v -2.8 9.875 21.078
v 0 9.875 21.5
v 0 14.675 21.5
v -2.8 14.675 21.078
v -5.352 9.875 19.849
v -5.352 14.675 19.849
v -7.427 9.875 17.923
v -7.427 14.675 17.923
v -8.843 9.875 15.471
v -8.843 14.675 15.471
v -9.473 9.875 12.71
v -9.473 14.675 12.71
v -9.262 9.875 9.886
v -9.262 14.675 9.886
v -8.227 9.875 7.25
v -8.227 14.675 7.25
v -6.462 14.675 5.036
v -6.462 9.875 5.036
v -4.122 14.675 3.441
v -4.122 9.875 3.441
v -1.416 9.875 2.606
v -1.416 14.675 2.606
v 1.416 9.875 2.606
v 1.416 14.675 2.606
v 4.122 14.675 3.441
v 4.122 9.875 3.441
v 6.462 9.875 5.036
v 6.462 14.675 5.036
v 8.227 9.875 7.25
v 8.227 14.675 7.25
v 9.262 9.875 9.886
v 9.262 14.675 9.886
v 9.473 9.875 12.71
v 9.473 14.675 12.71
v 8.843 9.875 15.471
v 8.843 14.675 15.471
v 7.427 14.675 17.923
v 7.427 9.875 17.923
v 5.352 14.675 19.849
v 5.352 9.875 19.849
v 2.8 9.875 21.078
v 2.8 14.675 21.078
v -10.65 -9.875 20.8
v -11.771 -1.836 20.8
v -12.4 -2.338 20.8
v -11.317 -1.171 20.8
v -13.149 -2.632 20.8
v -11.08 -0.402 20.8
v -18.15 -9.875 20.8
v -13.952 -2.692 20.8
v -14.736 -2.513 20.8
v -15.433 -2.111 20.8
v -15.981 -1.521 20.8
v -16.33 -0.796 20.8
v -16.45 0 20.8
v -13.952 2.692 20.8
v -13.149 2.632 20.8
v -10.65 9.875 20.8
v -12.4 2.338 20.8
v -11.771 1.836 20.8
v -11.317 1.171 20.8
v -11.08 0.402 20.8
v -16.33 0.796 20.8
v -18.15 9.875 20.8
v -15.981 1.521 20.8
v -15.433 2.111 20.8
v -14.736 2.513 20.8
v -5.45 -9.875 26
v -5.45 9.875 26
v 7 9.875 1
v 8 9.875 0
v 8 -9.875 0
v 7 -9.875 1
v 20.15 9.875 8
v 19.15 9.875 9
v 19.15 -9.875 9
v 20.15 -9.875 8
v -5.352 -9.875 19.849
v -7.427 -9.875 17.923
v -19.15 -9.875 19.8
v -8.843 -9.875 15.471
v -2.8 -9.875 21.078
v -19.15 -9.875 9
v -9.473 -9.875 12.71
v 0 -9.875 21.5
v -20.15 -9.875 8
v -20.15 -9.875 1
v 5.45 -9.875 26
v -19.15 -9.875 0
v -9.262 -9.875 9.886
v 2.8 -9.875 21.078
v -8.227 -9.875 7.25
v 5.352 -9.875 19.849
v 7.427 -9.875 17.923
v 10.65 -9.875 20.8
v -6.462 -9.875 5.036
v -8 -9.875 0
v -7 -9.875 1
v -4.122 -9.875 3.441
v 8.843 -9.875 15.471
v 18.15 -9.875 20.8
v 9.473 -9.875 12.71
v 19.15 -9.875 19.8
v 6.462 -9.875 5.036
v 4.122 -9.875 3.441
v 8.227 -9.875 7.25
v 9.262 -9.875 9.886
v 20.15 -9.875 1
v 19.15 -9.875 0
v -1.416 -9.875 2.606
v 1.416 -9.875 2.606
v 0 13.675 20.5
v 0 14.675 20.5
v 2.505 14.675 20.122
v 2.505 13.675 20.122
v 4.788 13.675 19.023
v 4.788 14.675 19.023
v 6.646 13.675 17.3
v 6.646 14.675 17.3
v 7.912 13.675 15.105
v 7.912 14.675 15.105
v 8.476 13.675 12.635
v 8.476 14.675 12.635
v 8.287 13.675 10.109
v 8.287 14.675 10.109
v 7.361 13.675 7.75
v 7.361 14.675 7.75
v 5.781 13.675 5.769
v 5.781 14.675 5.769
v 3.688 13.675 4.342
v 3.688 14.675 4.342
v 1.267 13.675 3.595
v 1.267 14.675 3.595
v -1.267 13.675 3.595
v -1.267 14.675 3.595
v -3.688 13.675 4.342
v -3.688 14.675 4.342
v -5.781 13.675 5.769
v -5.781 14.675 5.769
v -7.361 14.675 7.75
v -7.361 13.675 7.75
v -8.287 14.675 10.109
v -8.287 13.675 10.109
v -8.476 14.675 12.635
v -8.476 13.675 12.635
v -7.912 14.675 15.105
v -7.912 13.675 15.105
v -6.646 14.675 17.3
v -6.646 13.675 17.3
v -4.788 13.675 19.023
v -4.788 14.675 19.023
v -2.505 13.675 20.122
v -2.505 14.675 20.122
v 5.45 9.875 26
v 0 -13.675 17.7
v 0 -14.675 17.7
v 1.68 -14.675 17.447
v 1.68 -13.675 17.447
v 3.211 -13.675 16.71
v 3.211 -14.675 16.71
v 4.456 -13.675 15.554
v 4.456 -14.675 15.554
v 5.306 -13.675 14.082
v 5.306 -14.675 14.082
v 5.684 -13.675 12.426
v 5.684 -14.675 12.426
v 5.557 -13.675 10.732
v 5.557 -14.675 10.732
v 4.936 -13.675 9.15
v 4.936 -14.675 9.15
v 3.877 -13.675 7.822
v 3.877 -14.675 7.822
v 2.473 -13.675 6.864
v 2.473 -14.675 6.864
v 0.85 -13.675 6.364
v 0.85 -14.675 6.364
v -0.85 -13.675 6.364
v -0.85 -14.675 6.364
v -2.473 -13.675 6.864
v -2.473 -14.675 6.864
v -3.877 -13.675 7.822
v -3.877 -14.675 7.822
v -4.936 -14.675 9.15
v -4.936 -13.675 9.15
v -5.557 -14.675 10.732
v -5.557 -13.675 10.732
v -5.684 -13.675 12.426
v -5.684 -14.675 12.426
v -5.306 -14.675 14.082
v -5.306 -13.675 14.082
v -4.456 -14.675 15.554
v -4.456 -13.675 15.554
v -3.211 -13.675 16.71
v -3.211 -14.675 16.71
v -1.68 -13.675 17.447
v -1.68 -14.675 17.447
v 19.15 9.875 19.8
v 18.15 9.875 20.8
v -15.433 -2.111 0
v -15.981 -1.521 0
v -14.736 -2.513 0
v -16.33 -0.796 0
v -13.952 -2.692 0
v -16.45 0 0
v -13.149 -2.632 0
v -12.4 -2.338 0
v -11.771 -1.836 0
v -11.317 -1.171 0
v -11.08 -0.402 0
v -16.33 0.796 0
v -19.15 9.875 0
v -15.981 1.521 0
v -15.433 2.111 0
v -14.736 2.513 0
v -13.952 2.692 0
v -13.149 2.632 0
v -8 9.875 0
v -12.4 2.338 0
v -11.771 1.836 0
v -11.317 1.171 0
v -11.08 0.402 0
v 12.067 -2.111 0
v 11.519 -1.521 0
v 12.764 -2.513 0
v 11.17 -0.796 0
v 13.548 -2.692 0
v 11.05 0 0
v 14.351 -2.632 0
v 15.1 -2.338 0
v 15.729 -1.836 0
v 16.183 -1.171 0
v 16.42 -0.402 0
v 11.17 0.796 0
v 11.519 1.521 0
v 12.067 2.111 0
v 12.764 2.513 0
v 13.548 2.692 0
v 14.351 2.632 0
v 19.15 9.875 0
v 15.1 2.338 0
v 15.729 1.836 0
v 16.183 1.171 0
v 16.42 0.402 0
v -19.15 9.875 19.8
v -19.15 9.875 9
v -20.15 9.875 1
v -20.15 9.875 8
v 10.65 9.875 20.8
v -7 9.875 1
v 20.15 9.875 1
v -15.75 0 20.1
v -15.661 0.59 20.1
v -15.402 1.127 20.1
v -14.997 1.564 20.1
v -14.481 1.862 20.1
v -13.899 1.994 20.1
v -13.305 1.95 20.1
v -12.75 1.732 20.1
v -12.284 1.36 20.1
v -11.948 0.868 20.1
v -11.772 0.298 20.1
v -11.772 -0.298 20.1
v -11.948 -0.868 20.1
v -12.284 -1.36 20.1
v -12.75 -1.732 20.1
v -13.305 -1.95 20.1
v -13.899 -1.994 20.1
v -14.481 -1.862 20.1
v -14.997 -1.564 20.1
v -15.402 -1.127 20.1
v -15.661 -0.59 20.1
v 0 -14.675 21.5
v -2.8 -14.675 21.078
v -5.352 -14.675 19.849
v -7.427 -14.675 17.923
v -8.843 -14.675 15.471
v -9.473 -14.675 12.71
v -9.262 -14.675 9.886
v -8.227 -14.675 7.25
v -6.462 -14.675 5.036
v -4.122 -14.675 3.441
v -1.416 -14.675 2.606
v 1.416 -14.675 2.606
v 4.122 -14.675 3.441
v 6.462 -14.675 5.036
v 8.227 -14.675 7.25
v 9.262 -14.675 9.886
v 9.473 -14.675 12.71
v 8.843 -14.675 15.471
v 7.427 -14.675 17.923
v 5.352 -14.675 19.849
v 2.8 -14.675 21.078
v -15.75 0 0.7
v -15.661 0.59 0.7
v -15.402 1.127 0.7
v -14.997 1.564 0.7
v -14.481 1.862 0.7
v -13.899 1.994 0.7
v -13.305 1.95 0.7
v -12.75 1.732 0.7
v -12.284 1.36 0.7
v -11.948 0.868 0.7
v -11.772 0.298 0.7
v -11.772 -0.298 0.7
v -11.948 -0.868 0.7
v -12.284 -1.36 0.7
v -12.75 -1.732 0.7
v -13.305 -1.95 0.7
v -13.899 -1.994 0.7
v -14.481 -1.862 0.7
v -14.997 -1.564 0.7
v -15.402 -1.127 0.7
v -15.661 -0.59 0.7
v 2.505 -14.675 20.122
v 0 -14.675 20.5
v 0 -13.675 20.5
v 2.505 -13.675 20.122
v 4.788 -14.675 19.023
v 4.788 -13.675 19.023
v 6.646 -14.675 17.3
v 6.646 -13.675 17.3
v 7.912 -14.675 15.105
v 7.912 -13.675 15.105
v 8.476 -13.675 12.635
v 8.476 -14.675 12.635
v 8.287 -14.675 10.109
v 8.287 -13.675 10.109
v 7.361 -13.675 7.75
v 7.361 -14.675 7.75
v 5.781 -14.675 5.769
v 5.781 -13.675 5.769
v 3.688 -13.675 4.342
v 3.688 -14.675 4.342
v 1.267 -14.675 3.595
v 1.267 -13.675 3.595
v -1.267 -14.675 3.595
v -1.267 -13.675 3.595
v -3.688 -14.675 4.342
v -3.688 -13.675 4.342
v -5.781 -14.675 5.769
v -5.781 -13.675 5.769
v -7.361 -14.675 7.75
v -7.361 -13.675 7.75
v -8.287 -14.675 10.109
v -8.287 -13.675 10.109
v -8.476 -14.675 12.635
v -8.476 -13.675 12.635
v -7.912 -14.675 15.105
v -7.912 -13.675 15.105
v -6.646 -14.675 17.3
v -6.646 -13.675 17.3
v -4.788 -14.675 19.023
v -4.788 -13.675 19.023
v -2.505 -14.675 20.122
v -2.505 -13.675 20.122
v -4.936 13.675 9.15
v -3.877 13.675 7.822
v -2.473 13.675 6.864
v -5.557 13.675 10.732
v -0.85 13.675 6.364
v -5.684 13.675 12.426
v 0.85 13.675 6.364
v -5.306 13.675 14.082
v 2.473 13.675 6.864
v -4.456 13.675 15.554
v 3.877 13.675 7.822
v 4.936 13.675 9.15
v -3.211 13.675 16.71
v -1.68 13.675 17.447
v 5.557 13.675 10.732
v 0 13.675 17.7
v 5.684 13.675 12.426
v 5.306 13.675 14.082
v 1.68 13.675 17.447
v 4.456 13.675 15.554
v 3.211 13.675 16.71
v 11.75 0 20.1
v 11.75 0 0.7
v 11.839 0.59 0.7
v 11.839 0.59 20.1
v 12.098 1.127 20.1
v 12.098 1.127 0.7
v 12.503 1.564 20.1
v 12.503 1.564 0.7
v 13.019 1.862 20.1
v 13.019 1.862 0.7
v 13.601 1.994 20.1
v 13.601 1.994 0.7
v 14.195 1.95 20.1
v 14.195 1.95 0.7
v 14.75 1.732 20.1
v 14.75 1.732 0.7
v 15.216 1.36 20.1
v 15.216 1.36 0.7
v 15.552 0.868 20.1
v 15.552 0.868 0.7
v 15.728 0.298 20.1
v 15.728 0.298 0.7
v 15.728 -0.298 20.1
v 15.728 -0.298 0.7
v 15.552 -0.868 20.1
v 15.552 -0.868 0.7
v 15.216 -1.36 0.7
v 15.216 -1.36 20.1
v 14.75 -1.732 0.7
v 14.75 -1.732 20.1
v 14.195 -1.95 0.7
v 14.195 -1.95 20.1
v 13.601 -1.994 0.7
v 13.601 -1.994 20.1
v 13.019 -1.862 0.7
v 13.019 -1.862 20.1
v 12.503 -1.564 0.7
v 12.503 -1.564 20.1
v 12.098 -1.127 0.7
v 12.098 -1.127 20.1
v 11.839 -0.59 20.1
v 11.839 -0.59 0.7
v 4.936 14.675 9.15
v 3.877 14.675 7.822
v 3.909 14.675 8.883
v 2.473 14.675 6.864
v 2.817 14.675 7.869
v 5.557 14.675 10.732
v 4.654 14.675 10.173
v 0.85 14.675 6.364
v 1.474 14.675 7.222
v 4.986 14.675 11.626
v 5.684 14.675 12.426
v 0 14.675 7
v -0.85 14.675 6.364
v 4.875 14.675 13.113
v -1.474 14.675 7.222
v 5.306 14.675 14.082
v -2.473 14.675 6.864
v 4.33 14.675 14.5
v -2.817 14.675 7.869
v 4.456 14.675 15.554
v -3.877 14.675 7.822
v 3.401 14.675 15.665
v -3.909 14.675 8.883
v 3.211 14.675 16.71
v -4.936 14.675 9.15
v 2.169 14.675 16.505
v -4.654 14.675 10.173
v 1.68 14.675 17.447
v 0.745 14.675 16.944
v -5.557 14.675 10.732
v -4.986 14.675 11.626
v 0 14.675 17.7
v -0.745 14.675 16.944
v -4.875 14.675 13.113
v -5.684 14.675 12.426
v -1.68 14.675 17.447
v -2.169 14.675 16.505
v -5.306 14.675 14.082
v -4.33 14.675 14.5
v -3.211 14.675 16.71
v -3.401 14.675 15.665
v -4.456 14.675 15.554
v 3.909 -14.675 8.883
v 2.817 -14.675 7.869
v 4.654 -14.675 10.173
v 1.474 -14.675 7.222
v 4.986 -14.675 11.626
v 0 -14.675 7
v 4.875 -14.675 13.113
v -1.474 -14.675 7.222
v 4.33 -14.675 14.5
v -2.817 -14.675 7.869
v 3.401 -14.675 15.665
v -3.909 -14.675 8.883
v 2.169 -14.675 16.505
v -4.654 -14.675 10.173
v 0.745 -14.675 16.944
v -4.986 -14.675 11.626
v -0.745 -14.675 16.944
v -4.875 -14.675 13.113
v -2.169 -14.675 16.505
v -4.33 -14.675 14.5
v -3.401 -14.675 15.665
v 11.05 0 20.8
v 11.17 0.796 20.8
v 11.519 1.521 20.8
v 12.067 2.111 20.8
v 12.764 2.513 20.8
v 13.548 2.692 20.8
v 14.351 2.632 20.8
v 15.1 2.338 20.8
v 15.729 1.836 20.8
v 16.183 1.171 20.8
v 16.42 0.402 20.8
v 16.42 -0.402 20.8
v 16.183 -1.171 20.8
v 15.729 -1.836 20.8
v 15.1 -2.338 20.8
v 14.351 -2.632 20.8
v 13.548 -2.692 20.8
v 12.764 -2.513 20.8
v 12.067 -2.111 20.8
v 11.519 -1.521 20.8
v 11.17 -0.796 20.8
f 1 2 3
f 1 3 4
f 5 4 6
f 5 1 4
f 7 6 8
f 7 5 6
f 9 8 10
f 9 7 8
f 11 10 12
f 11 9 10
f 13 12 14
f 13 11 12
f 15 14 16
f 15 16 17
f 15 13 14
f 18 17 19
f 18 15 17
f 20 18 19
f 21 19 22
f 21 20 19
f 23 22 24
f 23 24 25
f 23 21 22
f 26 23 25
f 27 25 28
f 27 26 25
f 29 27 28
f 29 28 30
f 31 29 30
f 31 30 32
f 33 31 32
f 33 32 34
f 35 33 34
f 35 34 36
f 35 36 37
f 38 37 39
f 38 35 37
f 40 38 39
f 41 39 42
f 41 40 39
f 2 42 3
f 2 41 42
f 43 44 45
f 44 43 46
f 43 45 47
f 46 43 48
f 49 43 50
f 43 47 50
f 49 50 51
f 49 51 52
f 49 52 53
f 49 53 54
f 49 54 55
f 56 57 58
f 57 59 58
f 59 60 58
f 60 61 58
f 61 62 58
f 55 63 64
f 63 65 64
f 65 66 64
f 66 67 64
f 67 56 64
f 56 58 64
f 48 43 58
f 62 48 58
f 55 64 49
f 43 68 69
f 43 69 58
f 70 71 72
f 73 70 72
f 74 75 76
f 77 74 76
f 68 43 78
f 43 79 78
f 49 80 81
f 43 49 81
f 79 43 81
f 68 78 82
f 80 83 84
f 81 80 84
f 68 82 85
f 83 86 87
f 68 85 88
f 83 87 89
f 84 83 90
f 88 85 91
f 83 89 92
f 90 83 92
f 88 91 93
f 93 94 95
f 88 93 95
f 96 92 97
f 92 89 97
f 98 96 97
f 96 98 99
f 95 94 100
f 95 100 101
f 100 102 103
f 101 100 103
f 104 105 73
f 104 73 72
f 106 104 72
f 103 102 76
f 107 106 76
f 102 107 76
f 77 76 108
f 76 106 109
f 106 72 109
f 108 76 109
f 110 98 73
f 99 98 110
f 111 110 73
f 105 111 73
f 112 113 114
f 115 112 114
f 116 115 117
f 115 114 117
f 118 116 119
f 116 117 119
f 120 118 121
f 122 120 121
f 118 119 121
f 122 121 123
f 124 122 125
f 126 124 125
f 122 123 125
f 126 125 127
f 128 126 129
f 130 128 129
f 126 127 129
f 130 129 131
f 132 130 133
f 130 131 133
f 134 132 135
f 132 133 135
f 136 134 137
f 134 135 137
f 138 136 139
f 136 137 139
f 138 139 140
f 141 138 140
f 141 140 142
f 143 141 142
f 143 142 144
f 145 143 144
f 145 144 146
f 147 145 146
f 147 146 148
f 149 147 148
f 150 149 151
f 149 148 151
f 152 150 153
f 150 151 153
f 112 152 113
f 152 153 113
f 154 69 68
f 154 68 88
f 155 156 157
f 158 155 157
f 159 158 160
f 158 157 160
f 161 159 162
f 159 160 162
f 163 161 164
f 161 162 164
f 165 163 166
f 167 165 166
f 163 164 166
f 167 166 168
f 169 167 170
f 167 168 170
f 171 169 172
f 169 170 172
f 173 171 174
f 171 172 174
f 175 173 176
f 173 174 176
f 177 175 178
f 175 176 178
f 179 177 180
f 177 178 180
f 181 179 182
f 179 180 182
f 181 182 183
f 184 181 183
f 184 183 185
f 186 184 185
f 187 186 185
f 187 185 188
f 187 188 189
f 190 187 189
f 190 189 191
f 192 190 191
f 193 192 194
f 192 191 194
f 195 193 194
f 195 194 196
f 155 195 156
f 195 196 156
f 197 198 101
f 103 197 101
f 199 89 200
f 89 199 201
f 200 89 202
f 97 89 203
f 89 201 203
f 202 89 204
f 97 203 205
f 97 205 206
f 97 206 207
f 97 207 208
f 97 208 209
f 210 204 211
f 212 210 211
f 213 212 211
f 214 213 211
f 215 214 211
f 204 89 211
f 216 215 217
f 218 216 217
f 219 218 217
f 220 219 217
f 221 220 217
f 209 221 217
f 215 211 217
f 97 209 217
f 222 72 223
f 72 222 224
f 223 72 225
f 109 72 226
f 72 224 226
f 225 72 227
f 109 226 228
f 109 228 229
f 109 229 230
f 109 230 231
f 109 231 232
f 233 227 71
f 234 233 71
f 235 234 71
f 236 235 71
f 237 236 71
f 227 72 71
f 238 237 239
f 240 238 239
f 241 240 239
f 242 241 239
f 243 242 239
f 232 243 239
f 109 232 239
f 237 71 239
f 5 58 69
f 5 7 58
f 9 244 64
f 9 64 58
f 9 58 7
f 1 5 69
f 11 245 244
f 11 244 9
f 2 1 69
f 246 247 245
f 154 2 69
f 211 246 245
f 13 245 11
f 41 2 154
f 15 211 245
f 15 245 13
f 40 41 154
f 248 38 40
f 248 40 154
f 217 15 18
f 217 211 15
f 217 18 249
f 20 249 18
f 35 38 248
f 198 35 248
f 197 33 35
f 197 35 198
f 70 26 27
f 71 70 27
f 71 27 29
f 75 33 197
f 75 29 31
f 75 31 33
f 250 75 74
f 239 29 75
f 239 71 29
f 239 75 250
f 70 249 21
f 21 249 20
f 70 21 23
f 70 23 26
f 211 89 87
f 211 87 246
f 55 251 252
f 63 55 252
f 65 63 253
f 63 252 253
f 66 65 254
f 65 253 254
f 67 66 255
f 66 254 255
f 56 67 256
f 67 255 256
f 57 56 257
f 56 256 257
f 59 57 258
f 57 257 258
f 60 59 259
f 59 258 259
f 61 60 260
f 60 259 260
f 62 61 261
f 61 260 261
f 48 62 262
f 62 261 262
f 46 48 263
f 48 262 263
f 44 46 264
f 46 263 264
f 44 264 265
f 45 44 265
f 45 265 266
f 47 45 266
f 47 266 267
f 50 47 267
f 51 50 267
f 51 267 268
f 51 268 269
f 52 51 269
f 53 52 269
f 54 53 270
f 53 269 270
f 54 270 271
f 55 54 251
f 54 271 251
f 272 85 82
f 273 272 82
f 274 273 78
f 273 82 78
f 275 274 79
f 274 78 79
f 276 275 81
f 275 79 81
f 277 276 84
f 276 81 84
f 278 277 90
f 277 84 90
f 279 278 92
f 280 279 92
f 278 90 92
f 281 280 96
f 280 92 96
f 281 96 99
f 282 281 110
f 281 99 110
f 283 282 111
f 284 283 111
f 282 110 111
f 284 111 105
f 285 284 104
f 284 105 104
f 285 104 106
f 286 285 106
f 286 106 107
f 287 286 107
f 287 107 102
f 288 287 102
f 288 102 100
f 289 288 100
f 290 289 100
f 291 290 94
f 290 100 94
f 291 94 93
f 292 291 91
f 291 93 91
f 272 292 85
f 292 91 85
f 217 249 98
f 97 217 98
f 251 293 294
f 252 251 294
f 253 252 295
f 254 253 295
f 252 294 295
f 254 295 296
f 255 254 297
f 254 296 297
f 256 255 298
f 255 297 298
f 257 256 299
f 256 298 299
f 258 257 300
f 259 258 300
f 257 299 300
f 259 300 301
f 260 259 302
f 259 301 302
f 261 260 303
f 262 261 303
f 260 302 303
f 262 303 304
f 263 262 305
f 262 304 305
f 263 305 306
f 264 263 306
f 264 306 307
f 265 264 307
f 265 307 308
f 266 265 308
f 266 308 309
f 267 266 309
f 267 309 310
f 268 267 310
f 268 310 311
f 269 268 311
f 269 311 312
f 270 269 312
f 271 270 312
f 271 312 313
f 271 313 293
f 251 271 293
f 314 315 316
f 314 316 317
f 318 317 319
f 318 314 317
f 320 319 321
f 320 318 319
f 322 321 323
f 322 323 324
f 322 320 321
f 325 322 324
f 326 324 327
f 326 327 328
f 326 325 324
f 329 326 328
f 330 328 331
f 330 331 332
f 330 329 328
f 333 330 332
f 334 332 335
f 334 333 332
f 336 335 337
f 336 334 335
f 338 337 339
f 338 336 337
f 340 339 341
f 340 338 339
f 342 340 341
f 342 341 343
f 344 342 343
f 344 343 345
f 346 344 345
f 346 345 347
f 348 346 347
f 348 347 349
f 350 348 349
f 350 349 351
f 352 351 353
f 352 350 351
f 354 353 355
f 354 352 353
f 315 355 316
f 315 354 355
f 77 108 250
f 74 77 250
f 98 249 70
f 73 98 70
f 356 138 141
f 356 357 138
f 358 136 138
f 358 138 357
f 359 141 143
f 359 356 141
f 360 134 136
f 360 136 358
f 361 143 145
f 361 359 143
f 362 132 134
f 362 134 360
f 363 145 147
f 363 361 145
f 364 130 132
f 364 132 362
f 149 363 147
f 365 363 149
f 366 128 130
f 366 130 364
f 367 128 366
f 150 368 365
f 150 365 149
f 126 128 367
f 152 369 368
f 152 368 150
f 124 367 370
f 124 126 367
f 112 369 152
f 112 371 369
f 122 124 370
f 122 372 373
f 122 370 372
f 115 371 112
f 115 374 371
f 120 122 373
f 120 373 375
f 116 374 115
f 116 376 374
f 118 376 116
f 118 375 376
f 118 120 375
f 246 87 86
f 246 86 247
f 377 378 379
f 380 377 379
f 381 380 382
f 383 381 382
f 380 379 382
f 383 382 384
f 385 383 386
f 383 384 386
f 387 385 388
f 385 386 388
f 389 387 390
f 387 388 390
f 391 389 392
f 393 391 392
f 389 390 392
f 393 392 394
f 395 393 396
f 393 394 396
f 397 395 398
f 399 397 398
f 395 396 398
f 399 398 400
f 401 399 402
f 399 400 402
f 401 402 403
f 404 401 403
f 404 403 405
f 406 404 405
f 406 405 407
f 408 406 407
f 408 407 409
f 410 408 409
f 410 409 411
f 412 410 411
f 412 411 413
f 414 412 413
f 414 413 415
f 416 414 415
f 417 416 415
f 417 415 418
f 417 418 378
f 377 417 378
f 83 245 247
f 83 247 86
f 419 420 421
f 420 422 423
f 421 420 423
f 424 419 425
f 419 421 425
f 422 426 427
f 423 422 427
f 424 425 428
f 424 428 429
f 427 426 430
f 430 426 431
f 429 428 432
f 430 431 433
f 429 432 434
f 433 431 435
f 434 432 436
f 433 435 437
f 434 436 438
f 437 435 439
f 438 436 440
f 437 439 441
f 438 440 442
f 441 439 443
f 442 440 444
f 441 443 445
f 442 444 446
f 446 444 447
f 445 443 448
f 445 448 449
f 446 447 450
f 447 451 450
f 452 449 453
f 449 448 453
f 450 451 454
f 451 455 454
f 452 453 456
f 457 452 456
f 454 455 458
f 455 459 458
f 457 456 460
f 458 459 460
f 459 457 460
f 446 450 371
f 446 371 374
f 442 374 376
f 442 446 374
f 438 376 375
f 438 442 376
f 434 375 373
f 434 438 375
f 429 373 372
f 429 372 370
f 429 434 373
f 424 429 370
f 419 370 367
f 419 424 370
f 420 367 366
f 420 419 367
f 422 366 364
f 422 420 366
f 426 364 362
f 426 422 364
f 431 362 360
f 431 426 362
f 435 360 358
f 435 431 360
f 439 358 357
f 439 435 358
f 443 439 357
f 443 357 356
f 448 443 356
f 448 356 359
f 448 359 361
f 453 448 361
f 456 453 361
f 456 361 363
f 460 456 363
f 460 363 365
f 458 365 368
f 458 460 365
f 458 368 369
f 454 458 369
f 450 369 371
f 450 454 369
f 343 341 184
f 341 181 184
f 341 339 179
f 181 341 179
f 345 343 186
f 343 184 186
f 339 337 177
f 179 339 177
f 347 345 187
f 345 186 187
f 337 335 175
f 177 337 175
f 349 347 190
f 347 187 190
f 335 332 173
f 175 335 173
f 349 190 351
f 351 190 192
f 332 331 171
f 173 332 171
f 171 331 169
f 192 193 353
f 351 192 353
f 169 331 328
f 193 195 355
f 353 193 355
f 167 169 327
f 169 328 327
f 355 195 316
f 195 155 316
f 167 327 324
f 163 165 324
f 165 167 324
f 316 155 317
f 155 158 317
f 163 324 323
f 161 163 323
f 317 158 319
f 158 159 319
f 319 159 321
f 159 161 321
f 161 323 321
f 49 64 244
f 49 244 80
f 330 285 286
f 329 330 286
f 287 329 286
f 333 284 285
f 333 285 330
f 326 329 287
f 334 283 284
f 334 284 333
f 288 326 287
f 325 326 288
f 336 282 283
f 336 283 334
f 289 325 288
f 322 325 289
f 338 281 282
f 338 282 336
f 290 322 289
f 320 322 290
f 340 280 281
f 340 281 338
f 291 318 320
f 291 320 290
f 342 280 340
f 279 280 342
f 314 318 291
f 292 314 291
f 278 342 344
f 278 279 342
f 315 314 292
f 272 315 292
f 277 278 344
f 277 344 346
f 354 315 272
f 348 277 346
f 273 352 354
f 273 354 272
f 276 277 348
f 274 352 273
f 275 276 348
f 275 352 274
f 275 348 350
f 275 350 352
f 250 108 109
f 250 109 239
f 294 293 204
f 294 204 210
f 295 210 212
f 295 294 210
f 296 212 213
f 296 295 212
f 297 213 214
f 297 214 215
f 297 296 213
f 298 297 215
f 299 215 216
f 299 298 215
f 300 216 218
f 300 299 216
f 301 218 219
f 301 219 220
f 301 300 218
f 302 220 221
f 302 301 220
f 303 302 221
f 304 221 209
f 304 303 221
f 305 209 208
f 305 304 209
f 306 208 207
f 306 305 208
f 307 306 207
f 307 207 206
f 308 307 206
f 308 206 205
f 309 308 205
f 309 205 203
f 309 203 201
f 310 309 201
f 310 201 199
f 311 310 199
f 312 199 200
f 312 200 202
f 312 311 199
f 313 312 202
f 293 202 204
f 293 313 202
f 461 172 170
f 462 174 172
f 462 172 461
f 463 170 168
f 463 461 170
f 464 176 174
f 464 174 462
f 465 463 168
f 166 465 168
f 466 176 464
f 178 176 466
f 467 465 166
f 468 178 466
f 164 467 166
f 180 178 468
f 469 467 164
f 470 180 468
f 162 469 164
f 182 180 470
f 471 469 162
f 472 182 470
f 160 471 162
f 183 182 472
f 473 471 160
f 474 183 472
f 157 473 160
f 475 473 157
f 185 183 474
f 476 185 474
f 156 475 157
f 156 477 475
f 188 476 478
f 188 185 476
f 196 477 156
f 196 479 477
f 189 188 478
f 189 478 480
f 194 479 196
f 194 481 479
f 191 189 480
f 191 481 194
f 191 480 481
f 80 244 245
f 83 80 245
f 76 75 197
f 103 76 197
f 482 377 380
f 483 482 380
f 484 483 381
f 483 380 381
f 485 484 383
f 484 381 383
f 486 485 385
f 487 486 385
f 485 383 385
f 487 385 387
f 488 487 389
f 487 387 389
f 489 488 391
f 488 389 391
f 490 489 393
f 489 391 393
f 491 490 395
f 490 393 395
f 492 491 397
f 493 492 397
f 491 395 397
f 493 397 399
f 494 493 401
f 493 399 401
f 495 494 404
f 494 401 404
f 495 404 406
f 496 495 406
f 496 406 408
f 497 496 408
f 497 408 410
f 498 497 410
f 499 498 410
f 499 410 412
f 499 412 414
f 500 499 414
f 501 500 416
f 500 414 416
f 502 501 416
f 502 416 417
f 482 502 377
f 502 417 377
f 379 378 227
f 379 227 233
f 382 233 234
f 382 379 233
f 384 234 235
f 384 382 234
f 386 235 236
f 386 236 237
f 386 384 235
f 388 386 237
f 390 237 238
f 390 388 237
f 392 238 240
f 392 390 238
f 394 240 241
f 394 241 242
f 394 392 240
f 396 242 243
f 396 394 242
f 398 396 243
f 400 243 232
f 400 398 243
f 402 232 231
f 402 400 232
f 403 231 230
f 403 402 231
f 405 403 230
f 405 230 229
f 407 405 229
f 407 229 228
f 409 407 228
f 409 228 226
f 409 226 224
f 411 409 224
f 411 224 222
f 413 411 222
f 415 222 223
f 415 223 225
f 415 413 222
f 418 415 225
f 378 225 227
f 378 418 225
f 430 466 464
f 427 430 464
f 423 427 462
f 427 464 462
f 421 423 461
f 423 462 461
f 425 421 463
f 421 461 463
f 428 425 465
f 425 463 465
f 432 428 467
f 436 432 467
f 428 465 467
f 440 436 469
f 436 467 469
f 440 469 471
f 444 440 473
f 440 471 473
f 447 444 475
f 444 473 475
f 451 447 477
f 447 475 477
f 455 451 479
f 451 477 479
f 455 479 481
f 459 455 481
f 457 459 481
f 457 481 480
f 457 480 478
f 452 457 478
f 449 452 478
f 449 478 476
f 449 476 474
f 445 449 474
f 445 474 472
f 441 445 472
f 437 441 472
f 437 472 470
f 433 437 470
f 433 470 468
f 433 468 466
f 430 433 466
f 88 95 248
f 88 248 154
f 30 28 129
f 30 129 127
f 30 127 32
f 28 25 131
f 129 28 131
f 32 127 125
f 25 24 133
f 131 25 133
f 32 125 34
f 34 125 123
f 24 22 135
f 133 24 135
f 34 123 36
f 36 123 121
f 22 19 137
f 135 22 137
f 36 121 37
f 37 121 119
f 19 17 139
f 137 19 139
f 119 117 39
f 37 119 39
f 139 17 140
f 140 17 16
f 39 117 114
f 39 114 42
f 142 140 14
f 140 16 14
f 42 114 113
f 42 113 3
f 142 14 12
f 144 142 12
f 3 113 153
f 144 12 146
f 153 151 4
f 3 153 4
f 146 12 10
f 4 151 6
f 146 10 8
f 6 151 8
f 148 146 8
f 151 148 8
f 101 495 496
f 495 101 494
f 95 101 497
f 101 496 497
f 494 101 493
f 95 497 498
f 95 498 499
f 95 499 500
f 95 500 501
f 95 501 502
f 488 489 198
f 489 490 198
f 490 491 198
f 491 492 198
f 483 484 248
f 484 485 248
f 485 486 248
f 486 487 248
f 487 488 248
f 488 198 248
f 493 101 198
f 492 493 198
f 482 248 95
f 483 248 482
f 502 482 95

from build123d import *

# Parameters (mm, degrees)
CROQUIS1_W              = 40.3
CROQUIS1_H              = 19.75
SALIENTE_EXTRUIR1_DEPTH = 26
CROQUIS2_W              = 14
CROQUIS2_H              = 1
CORTAR_EXTRUIR1_DEPTH   = 20
CROQUIS3_R              = 2
CORTAR_EXTRUIR2_DEPTH   = 26
CROQUIS4_R              = 9.5
SALIENTE_EXTRUIR2_DEPTH = 4.8
CROQUIS5_R              = 5
CORTAR_EXTRUIR3_DEPTH   = 30
CROQUIS6_R              = 8.5
CROQUIS6_R_2            = 5.7
CORTAR_EXTRUIR4_DEPTH   = 1
CHAFL_N1_SIZE           = 1
CHAFL_N2_SIZE           = 0.7


with BuildPart() as part:
    # Croquis1 → Saliente-Extruir1 (new body)
    with BuildSketch(Plane.XY):
        Rectangle(CROQUIS1_W, CROQUIS1_H)
    extrude(amount=SALIENTE_EXTRUIR1_DEPTH)

    # Croquis2 → Cortar-Extruir1 (cut)
    with BuildSketch(Plane(origin=(0, 9.875, 0), x_dir=(1, 0, 0), z_dir=(0, 1, 0))):
        Polygon((-19.15, -9), (-20.15, -9), (-20.15, -26), (-5.45, -26), (-10.65, -20.8), (-19.15, -20.8), align=None)
        Polygon((20.15, -26), (20.15, -9), (19.15, -9), (19.15, -20.8), (10.65, -20.8), (5.45, -26), align=None)
        with Locations((0, -0.5)):
            Rectangle(CROQUIS2_W, CROQUIS2_H)
    extrude(amount=-CORTAR_EXTRUIR1_DEPTH, mode=Mode.SUBTRACT)

    # Croquis3 → Cortar-Extruir2 (cut)
    with BuildSketch(Plane(origin=(0, 0, 0), x_dir=(-1, 0, 0), z_dir=(0, 0, -1))):
        with Locations((-13.75, 0)):
            Circle(CROQUIS3_R)
        with Locations((13.75, 0)):
            Circle(CROQUIS3_R)
    extrude(amount=-CORTAR_EXTRUIR2_DEPTH, mode=Mode.SUBTRACT)

    # Croquis4 → Saliente-Extruir2 (add)
    with BuildSketch(Plane.XZ.offset(9.875)):
        with Locations(Location((0, 12, 0), (0, 0, 90))):
            Circle(CROQUIS4_R)
    saliente_extruir2 = extrude(amount=SALIENTE_EXTRUIR2_DEPTH)

    # Simetría1: Saliente-Extruir2 across plane
    add(saliente_extruir2.mirror(Plane.ZX))

    # Croquis5 → Cortar-Extruir3 (cut)
    with BuildSketch(Plane.XZ.offset(14.675)):
        with Locations(Location((0, 12, 0), (0, 0, 270))):
            Circle(CROQUIS5_R)
    extrude(amount=-CORTAR_EXTRUIR3_DEPTH, mode=Mode.SUBTRACT)

    # Croquis6 → Cortar-Extruir4 (cut)
    with BuildSketch(Plane(origin=(0, 14.675, 0), x_dir=(1, 0, 0), z_dir=(0, 1, 0))):
        with Locations(Location((0, -12, 0), (0, 0, 270))):
            Circle(CROQUIS6_R)
        with Locations(Location((0, -12, 0), (0, 0, 270))):
            Circle(CROQUIS6_R_2, mode=Mode.SUBTRACT)
    cortar_extruir4 = extrude(amount=-CORTAR_EXTRUIR4_DEPTH, mode=Mode.SUBTRACT)

    # Simetría2: Cortar-Extruir4 across plane
    add(cortar_extruir4.mirror(Plane.ZX), mode=Mode.SUBTRACT)

    # Chaflán1
    chafl_n1_edges = [part.edges().sort_by_distance(p)[0] for p in [
        (-19.15, 0, 20.8),
        (-20.15, 0, 9),
        (19.15, 0, 20.8),
        (20.15, 0, 9),
        (-20.15, 0, 0),
        (20.15, 0, 0),
        (7, 0, 0),
        (-7, 0, 0),
    ]]
    chamfer(chafl_n1_edges, length=CHAFL_N1_SIZE - 0.0001)  # a hair under: the kernel refuses the full size

    # Chaflán2
    chafl_n2_edges = [part.edges().sort_by_distance(p)[0] for p in [
        (15.75, 0, 20.8),
        (15.75, 0, 0),
        (-11.75, 0, 20.8),
        (-11.75, 0, 0),
    ]]
    chamfer(chafl_n2_edges, length=CHAFL_N2_SIZE)


solid = part.part
